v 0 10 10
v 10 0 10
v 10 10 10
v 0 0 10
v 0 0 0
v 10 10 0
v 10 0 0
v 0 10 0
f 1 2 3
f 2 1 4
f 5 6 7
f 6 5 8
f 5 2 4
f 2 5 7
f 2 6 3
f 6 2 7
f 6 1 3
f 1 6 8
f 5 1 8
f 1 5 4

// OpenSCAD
// `*` disables a subtree exactly, on both sides
cube([10, 10, 10]);
*sphere(r = 20, $fn = 16);
